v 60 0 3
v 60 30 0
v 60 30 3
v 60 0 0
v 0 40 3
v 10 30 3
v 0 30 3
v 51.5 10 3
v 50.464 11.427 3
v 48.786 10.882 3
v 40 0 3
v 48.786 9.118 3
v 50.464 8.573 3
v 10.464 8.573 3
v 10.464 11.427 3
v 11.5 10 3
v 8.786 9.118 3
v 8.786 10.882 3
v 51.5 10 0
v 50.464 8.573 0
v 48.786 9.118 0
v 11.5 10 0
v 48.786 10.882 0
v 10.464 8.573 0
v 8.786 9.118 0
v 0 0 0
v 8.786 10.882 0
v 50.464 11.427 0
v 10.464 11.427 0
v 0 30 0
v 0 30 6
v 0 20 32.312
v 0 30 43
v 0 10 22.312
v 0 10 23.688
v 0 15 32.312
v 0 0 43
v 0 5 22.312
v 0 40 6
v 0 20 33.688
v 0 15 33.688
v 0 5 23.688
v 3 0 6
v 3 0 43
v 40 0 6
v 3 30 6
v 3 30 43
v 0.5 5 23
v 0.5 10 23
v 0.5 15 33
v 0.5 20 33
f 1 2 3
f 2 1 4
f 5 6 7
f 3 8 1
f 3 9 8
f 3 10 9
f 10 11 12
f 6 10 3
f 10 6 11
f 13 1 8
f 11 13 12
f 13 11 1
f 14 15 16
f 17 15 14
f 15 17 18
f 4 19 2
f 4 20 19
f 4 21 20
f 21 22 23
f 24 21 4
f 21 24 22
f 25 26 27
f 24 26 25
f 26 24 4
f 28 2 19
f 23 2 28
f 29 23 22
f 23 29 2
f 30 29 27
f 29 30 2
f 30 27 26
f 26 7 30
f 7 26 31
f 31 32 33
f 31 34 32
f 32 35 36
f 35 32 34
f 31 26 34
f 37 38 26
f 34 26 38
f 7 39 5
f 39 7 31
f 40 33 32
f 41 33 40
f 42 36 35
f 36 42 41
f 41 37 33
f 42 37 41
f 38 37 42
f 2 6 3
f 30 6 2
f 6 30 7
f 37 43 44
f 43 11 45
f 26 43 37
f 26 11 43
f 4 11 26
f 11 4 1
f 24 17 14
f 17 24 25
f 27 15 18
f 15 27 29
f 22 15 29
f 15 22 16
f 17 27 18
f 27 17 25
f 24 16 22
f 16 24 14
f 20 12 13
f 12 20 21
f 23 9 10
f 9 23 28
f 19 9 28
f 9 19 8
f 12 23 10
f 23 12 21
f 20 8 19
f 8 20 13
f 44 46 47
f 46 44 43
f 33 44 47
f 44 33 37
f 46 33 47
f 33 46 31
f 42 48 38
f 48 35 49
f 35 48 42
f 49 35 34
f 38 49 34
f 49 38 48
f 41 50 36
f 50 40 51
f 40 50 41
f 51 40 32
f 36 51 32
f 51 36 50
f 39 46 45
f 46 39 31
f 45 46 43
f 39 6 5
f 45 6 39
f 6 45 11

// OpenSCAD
// Parámetros
base_largo = 60;   // Largo de la base en mm
base_ancho = 30;   // Ancho de la base en mm
base_altura = 3;   // Grosor de la base en mm
pared_altura = 40; // Altura de la pared vertical
pared_grosor = 3;  // Grosor de la pared vertical
refuerzo_grosor = 3; // Grosor del triángulo de refuerzo
orificio_diam = 3;  // Diámetro de los orificios de montaje

module base() {
    difference() {
        cube([base_largo, base_ancho, base_altura]); 
        // Orificios en la base
        translate([10, 10, -1]) cylinder(h = base_altura + 2, d = orificio_diam);
        translate([50, 10, -1]) cylinder(h = base_altura + 2, d = orificio_diam);
    }
}

module pared() {
    translate([0, 0, base_altura])
    difference() {
        cube([pared_grosor, base_ancho, pared_altura]); 
        // Orificios en la pared
        translate([-1, 10, 20]) rotate([90, 0, 0]) cylinder(h = pared_grosor + 2, d = orificio_diam);
        translate([-1, 20, 30]) rotate([90, 0, 0]) cylinder(h = pared_grosor + 2, d = orificio_diam);
    }
}

module refuerzo() {
    translate([0, 0, base_altura])
    linear_extrude(height = refuerzo_grosor)
    polygon(points=[[0,0], [0, pared_altura], [pared_altura, 0]]);
}

// Ensamblaje
base();
pared();
refuerzo();
